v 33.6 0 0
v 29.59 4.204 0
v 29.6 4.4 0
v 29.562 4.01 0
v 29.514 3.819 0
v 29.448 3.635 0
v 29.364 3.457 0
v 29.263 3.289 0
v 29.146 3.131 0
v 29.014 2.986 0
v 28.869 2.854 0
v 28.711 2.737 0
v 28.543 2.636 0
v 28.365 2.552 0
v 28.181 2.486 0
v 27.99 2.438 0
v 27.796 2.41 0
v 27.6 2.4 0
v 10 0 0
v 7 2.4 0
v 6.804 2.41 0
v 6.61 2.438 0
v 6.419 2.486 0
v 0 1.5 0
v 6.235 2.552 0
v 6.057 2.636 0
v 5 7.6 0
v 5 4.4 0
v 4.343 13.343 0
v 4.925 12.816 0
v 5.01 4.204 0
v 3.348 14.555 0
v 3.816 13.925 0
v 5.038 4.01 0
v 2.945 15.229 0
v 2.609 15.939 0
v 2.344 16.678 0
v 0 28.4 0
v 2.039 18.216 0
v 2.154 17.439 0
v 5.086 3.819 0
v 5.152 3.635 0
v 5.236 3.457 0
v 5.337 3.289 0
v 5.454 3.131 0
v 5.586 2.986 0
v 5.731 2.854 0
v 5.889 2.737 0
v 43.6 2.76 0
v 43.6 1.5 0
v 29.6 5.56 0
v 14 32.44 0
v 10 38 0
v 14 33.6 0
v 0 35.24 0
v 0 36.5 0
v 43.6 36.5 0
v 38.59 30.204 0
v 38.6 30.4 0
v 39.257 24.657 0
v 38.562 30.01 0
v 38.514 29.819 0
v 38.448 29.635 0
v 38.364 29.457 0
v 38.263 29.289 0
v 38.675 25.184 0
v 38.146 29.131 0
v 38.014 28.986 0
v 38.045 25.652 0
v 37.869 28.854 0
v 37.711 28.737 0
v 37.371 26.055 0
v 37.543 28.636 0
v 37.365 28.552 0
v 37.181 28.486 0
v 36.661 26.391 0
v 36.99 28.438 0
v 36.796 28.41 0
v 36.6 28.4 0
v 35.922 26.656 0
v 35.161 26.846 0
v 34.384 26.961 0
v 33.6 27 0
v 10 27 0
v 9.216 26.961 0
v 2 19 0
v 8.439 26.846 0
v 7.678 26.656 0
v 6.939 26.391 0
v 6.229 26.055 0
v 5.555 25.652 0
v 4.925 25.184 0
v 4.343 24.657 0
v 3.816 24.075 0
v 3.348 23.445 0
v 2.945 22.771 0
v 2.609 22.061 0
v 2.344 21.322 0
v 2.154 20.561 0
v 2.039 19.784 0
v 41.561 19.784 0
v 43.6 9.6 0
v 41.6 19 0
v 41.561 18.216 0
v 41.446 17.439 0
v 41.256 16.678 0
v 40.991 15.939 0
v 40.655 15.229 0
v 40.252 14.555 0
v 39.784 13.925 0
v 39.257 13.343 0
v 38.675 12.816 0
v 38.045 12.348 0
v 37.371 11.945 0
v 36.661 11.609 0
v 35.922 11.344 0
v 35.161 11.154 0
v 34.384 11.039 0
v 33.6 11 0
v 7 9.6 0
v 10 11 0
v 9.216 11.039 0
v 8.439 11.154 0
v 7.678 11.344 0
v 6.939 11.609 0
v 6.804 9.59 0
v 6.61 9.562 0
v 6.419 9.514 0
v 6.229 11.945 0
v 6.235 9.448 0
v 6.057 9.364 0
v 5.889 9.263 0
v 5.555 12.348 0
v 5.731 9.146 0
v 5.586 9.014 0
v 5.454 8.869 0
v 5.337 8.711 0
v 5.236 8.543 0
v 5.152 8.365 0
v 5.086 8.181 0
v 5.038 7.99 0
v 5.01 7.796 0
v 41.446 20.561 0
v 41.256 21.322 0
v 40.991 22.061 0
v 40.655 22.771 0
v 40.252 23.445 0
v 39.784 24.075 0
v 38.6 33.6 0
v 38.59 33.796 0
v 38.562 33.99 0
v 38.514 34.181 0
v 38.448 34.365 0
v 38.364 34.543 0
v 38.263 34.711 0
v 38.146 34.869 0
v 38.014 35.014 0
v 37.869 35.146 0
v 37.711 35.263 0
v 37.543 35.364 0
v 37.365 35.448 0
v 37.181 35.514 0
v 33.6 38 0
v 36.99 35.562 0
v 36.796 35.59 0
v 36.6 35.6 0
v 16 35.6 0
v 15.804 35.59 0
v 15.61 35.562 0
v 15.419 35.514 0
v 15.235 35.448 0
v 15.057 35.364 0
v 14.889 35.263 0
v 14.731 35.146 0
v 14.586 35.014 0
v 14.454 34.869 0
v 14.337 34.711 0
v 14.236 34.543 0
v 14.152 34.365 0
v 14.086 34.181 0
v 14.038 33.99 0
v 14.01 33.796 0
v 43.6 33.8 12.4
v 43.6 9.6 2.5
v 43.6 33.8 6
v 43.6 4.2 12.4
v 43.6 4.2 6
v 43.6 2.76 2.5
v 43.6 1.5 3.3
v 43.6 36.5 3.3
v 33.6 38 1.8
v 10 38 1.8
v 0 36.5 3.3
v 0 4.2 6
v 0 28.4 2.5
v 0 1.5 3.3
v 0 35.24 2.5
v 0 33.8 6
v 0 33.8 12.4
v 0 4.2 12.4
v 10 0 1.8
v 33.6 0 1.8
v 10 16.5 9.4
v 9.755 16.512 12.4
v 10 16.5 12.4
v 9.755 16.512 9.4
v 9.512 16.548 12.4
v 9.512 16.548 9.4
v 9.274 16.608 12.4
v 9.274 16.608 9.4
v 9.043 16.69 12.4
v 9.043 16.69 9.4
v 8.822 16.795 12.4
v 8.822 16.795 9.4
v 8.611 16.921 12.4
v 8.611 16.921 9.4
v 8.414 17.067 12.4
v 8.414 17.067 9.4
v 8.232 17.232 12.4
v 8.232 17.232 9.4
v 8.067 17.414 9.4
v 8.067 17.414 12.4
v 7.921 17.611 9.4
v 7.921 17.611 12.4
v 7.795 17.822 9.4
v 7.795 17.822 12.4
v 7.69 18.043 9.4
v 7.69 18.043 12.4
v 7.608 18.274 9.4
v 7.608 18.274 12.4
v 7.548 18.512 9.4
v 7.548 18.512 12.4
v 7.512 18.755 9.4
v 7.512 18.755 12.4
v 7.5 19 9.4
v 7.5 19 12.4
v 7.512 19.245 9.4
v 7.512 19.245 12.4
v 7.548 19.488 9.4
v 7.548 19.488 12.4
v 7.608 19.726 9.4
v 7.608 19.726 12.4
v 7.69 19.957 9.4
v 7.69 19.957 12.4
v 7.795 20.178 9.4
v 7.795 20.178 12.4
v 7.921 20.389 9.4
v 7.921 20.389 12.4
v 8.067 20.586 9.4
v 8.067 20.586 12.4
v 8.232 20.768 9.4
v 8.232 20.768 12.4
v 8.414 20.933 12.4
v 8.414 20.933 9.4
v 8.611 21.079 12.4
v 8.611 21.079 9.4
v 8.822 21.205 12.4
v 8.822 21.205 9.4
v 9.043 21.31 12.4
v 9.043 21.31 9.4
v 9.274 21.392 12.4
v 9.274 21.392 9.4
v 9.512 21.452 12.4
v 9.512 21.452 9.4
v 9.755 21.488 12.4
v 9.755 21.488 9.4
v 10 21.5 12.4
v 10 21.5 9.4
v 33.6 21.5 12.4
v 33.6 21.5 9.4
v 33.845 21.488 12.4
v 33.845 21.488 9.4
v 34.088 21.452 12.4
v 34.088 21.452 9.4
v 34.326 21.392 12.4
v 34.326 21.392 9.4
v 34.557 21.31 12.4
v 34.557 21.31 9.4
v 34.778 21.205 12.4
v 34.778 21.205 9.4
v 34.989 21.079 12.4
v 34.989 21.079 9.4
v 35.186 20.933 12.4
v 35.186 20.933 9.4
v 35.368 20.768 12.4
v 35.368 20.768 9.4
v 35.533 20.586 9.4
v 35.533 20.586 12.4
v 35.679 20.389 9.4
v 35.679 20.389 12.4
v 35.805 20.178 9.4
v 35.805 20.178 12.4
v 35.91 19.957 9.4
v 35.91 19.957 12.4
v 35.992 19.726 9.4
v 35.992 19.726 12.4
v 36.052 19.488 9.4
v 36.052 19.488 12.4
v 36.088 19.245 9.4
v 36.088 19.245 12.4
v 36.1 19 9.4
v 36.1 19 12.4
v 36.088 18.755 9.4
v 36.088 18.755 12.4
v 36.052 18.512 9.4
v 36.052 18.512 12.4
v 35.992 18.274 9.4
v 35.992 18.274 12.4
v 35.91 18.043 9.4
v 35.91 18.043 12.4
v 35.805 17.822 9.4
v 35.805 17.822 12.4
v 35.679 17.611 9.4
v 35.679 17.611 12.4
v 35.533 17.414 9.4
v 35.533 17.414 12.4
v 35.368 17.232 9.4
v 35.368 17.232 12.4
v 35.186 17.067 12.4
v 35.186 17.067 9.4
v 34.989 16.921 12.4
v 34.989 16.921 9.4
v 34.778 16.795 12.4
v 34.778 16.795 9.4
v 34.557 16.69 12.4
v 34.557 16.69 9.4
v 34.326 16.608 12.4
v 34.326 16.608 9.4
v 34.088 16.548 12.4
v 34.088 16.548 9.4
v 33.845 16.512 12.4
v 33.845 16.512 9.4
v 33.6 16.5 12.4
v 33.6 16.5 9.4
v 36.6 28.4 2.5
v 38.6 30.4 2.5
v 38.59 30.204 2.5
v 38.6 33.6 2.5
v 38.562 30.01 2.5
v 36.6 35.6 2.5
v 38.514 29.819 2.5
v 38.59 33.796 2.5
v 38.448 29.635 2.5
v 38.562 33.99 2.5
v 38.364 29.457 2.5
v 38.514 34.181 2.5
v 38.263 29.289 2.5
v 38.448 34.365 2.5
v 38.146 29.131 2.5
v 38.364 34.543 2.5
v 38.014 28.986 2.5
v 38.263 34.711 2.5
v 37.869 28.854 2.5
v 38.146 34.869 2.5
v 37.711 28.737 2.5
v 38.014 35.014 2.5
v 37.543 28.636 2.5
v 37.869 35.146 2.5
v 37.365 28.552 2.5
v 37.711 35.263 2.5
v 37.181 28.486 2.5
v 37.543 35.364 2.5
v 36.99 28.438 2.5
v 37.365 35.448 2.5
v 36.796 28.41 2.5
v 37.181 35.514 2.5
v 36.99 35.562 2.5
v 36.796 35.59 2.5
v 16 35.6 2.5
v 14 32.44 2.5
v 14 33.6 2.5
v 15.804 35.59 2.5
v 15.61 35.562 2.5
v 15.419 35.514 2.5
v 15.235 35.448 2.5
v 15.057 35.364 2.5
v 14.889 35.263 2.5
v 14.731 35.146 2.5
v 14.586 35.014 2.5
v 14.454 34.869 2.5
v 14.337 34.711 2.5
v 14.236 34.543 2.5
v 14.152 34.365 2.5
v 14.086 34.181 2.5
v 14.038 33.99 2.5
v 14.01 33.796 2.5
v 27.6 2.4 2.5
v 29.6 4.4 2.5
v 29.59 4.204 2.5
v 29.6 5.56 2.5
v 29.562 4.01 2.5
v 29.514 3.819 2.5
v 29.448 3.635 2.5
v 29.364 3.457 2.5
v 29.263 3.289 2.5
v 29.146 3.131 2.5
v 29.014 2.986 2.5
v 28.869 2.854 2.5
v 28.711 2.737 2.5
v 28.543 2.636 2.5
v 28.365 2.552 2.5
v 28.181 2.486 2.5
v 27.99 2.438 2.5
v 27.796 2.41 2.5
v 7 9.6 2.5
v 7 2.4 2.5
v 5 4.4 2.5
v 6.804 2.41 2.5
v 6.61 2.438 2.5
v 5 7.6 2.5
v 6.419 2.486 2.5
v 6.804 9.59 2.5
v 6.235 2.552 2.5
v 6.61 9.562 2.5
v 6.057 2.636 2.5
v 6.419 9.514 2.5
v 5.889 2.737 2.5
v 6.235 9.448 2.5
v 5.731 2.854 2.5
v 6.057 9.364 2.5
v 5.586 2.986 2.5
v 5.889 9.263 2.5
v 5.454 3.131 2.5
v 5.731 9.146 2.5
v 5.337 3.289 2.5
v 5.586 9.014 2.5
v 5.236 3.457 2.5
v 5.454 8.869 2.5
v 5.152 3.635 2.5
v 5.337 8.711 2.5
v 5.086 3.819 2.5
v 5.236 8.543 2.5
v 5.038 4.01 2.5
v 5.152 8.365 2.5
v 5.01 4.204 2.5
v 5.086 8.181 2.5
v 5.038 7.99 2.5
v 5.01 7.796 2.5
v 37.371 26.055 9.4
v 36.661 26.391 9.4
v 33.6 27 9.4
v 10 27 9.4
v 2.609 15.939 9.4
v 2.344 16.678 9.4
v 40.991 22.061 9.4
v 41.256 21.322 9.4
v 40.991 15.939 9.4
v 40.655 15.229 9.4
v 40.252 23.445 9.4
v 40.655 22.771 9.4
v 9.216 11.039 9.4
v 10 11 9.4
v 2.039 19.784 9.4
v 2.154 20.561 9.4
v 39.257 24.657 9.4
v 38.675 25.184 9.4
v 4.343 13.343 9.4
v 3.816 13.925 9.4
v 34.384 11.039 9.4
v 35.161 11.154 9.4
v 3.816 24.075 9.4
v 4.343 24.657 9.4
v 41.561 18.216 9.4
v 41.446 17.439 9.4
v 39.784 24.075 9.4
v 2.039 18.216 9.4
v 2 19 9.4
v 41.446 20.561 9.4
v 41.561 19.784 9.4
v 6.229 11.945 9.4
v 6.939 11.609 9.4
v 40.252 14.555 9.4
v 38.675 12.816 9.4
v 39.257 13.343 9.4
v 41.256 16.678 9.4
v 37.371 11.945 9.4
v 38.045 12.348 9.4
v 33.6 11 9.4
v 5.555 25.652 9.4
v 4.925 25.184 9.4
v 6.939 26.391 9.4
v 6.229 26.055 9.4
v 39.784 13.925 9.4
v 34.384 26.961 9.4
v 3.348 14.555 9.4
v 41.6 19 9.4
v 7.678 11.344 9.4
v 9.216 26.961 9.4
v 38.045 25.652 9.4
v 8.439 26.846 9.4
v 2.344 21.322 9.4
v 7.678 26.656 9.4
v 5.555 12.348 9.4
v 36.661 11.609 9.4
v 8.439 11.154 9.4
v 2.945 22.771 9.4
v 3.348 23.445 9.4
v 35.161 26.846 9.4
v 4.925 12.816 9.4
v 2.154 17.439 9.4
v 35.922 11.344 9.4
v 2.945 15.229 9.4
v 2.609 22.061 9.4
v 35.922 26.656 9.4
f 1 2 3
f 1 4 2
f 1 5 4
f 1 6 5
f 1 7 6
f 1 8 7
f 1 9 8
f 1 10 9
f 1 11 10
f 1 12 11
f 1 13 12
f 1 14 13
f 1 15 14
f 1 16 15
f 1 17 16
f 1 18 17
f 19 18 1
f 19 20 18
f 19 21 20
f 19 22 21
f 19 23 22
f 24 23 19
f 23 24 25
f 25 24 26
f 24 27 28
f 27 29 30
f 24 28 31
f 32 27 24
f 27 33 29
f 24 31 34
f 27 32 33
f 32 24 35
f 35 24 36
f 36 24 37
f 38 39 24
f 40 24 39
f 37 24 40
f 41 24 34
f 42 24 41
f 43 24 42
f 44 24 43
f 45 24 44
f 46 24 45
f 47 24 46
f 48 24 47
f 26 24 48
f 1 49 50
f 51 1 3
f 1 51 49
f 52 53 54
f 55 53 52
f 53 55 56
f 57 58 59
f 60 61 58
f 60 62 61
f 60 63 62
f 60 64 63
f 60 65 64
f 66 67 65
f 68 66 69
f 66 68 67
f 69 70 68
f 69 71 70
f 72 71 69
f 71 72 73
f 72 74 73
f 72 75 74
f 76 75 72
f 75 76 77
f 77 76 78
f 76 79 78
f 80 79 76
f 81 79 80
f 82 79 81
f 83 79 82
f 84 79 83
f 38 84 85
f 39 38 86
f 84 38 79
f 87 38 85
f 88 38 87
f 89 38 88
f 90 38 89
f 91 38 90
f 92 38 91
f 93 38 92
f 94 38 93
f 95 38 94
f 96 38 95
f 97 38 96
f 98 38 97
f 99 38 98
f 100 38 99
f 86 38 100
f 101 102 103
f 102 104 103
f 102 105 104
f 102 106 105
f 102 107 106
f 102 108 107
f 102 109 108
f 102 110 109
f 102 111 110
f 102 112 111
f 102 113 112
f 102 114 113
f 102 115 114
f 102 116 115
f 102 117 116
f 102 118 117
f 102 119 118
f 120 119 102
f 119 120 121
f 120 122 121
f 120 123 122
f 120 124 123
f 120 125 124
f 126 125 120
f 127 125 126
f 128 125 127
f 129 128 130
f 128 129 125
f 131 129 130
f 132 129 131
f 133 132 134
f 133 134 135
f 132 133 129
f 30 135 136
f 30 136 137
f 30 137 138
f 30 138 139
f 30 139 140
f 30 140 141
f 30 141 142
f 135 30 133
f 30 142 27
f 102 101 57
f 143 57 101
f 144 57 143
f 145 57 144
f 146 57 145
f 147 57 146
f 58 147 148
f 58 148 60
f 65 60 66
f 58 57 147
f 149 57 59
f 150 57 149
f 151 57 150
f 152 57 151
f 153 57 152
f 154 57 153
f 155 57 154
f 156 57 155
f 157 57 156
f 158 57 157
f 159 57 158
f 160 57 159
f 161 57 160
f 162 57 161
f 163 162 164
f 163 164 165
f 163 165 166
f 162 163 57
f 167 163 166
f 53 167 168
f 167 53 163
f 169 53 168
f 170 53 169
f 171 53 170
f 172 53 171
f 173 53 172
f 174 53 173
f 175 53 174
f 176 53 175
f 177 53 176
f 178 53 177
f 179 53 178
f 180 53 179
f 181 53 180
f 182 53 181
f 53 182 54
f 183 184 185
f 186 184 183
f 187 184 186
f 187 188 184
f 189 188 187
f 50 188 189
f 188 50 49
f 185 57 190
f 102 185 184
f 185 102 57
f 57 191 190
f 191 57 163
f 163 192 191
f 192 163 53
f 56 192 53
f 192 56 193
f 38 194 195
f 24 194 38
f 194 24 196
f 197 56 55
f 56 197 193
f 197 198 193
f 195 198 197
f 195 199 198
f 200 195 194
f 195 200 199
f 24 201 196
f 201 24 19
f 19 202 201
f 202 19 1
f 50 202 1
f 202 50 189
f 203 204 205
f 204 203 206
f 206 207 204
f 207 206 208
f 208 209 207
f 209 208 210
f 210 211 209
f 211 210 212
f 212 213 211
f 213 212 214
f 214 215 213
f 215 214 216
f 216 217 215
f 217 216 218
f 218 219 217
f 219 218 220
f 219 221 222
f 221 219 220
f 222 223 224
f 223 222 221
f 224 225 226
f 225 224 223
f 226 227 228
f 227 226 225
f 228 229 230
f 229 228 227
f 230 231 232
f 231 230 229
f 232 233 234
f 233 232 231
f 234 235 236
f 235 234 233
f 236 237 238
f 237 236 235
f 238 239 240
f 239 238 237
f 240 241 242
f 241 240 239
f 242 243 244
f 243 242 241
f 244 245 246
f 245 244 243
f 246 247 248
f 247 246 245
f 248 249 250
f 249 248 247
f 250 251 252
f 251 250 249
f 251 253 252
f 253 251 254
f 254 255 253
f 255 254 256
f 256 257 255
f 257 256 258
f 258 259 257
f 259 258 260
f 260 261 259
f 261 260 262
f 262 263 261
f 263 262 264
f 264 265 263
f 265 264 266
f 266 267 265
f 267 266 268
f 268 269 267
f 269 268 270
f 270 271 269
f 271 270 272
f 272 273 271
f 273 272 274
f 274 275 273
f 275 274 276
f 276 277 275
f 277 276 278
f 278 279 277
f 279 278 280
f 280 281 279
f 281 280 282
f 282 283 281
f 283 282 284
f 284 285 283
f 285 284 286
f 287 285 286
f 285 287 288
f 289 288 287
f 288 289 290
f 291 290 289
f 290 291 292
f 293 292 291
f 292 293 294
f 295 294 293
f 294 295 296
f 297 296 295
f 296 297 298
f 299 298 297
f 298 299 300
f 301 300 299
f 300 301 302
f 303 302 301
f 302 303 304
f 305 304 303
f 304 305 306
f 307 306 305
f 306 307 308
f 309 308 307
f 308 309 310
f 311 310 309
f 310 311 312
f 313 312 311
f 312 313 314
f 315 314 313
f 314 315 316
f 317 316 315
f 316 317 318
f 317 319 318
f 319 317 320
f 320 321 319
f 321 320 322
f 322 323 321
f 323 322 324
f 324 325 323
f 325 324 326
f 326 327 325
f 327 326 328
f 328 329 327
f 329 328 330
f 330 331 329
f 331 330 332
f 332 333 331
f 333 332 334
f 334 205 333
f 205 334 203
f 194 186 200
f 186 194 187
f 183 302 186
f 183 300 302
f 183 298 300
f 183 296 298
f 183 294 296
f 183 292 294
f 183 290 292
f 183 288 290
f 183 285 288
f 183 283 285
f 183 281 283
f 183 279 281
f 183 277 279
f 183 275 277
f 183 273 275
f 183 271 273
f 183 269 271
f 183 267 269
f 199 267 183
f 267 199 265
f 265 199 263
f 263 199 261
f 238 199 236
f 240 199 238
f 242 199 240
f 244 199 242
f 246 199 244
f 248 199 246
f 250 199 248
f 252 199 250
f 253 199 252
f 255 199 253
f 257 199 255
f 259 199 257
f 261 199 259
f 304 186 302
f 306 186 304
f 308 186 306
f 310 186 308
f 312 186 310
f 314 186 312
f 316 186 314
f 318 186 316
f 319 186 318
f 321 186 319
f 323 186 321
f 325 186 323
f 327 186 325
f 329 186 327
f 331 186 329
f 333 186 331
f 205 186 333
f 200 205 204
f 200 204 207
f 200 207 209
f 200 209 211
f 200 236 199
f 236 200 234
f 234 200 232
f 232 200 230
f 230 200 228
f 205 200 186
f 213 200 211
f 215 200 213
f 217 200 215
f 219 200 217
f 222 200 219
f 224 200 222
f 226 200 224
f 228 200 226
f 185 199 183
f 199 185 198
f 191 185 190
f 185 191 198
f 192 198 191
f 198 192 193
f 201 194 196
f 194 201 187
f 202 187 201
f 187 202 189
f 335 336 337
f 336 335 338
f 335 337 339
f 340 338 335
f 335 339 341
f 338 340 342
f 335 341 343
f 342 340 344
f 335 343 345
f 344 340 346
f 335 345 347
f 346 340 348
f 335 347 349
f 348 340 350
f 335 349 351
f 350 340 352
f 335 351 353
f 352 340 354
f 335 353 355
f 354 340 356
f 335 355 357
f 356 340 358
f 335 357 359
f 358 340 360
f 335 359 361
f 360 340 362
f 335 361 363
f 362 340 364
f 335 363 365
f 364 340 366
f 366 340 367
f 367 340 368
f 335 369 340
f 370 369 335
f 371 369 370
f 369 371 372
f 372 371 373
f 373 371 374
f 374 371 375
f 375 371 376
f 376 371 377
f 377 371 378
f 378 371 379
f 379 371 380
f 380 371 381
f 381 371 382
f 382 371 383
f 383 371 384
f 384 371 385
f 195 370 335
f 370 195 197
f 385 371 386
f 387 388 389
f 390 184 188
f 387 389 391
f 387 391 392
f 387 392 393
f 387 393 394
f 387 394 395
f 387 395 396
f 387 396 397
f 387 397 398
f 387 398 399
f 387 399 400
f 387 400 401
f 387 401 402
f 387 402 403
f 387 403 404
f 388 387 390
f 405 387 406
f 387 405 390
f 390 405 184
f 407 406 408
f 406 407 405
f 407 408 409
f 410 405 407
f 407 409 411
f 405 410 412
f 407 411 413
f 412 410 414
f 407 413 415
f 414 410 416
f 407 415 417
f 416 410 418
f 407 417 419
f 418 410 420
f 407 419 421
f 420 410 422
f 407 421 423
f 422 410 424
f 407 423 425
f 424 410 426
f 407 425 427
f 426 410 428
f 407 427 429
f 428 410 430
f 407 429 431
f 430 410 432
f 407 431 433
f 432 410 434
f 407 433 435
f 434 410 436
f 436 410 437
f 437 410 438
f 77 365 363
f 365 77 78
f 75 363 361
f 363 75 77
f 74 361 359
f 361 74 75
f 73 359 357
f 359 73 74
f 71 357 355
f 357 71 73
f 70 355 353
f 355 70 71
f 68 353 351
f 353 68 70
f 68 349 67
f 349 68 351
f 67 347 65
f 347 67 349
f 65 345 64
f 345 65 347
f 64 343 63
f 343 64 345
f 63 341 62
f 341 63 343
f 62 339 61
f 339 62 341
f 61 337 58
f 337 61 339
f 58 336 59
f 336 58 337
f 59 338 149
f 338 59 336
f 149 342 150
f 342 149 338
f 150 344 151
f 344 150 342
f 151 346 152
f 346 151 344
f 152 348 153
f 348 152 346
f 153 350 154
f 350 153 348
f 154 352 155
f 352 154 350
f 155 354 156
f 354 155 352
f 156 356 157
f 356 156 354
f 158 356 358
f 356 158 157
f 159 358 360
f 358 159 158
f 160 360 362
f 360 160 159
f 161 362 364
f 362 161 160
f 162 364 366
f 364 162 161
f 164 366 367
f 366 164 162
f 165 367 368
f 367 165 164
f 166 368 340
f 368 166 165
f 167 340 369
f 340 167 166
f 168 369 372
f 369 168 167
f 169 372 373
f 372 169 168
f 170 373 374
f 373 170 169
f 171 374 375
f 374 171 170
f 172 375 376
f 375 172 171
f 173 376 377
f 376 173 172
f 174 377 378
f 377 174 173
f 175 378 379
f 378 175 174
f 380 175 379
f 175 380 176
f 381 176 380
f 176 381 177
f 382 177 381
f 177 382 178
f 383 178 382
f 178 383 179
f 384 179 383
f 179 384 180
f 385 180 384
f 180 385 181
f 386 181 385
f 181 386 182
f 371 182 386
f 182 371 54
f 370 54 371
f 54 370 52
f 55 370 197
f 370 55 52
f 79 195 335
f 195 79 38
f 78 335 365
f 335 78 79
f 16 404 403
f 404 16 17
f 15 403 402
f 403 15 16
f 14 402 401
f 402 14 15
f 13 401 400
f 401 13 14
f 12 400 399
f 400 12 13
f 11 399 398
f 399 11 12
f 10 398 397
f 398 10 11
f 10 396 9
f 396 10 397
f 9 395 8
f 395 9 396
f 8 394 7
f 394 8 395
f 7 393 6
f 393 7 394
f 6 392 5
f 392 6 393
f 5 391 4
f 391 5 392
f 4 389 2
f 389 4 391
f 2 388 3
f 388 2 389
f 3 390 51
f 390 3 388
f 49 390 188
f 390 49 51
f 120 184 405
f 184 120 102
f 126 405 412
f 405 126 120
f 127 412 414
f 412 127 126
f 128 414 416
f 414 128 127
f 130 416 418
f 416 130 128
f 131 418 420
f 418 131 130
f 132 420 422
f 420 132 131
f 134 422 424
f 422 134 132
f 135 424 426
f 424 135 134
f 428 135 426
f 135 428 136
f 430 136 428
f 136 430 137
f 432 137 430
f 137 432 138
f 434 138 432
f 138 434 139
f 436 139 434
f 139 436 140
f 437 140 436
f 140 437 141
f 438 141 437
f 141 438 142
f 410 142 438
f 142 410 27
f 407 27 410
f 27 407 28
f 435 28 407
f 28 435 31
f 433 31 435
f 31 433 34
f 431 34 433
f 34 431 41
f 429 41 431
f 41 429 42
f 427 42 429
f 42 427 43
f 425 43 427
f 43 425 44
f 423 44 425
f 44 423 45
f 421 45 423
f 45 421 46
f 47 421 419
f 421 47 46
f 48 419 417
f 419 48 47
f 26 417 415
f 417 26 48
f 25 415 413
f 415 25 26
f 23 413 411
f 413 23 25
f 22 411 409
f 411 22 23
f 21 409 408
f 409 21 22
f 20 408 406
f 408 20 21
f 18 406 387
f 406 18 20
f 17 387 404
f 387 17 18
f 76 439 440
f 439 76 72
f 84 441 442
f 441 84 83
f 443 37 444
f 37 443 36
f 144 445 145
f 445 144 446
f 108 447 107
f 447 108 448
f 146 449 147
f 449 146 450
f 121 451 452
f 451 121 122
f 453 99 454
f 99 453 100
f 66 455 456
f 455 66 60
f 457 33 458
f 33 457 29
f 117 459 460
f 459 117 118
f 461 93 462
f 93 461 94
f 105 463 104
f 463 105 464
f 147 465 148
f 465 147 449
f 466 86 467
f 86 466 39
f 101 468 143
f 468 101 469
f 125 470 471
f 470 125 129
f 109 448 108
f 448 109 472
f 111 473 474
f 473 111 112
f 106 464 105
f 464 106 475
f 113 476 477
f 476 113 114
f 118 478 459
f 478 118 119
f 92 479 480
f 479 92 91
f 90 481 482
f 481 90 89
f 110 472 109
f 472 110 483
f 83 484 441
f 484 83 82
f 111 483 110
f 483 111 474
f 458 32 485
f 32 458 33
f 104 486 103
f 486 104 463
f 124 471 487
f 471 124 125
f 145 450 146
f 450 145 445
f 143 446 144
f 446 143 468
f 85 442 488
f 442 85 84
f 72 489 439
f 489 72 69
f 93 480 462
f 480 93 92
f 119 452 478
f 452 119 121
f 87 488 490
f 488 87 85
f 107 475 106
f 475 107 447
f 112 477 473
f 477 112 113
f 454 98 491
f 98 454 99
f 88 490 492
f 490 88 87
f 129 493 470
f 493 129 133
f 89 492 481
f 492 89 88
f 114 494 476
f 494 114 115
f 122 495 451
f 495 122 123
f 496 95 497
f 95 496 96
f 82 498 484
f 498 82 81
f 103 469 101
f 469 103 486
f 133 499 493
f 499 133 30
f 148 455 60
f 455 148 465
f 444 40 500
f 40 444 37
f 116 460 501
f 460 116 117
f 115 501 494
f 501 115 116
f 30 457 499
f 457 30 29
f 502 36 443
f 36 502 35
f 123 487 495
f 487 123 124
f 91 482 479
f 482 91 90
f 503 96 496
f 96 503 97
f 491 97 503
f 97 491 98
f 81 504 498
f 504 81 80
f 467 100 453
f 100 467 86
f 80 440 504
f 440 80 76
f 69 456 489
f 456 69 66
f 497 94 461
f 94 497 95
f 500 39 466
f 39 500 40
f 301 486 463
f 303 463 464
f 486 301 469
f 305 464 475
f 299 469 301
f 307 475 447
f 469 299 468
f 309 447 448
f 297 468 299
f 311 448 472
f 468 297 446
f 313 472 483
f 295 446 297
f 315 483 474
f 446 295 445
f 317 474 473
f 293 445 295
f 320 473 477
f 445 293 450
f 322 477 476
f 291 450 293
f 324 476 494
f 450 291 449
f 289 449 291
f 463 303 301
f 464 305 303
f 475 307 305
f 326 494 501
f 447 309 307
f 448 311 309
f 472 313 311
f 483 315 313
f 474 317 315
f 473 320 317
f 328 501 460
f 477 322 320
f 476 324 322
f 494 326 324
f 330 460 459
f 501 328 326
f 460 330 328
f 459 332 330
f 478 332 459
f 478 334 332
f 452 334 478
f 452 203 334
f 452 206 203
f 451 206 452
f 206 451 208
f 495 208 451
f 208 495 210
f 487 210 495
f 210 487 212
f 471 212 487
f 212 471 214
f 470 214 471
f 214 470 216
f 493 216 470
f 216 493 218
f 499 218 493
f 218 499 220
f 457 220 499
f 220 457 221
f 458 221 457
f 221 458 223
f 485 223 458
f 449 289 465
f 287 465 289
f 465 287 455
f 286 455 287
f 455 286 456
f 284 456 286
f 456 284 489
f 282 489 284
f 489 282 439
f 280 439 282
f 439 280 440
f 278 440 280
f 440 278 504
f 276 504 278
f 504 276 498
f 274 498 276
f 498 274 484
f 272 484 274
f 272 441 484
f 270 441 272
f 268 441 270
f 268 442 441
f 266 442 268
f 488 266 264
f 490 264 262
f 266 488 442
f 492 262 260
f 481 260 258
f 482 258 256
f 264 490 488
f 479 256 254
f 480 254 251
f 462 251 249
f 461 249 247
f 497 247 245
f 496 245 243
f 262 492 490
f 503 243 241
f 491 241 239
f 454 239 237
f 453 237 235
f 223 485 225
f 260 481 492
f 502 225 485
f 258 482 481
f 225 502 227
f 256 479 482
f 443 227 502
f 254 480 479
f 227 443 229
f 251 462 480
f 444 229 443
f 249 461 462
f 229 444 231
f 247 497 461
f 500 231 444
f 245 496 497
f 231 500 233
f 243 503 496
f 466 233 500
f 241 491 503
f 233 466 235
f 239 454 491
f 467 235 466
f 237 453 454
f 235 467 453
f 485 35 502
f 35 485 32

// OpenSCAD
// Plate for dji rs3 mini stab
// Allows mounting camera sideways,
// as it does not have aligning protrusion like the original one
$fn=64;
height=12.4;
height_top=6.4;
width=38;
width_top=29.6;
depth=43.6;
tcx=10;
tcy=1.5;

pin_length=2.5; //1.7 in reality
pin_diameter=4; //3.4 in reality
lock_thickness=2.4;
lock=lock_thickness+pin_diameter/2;
open_thickness=5.6;
open=open_thickness+pin_diameter/2;
lock_end_thickness=5;
lock_end=depth-lock_end_thickness-pin_diameter/2;
lock_start_thickness=14;
lock_start=lock_start_thickness+pin_diameter/2;

bolt_diameter=16;
bolt_head=height-3;
thread_begin=10;
thread_end=depth-thread_begin;
width_bottom=width_top+2*(height-height_top);
module top_view(){
  difference() {
  polygon(points=[[tcx,0],[depth-tcx,0],[depth,tcy],[depth,width-tcy],[depth-tcx,width],[tcx,width],[0,width-tcy],[0,tcy]]);
  hull() {
    translate([thread_begin,width/2,0]) circle(d=5);
    translate([thread_end,width/2,0]) circle(d=5);
  }
  }
}
module side_view(){
  square([depth,height]);
}
module rear_view(){
  *square([height,width]);
  polygon([[0,(width-width_bottom)/2],[height-height_top,(width-width_top)/2],[height,(width-width_top)/2],[height,(width+width_top)/2],[height-height_top,(width+width_top)/2],[0,(width+width_bottom)/2]]);
}
module inner_structure(){
  linear_extrude(pin_length) {
    pin_cutout();
    translate([depth,width])rotate(180) pin_cutout();
  }
  hull() {
    translate([thread_begin,width/2,0])cylinder(d=bolt_diameter,h=bolt_head);
    translate([thread_end,width/2,0])cylinder(d=bolt_diameter,h=bolt_head);
  } 
}
module pin_cutout() {
  pinpoints=[[-pin_diameter/2,width-lock],[lock_start-pin_diameter/2,width-open],[lock_start,width-open],[lock_start,width-lock],[lock_end,width-lock],[lock_end,width-open],[-pin_diameter/2,width-open]];
  for (i=[0:1:5]) hull() {
    translate(pinpoints[i]) circle(d=pin_diameter);
    translate(pinpoints[i+1]) circle(d=pin_diameter);
  }
    
}
difference() {
  intersection() {
    linear_extrude(height,convexity=2) top_view();
    rotate([-90,0,0]) mirror([0,1,0]) linear_extrude(width,convexity=2) side_view();
    rotate([0,90,0]) mirror([1,0,0]) linear_extrude(depth,convexity=2) rear_view();
  }
  inner_structure();
}
